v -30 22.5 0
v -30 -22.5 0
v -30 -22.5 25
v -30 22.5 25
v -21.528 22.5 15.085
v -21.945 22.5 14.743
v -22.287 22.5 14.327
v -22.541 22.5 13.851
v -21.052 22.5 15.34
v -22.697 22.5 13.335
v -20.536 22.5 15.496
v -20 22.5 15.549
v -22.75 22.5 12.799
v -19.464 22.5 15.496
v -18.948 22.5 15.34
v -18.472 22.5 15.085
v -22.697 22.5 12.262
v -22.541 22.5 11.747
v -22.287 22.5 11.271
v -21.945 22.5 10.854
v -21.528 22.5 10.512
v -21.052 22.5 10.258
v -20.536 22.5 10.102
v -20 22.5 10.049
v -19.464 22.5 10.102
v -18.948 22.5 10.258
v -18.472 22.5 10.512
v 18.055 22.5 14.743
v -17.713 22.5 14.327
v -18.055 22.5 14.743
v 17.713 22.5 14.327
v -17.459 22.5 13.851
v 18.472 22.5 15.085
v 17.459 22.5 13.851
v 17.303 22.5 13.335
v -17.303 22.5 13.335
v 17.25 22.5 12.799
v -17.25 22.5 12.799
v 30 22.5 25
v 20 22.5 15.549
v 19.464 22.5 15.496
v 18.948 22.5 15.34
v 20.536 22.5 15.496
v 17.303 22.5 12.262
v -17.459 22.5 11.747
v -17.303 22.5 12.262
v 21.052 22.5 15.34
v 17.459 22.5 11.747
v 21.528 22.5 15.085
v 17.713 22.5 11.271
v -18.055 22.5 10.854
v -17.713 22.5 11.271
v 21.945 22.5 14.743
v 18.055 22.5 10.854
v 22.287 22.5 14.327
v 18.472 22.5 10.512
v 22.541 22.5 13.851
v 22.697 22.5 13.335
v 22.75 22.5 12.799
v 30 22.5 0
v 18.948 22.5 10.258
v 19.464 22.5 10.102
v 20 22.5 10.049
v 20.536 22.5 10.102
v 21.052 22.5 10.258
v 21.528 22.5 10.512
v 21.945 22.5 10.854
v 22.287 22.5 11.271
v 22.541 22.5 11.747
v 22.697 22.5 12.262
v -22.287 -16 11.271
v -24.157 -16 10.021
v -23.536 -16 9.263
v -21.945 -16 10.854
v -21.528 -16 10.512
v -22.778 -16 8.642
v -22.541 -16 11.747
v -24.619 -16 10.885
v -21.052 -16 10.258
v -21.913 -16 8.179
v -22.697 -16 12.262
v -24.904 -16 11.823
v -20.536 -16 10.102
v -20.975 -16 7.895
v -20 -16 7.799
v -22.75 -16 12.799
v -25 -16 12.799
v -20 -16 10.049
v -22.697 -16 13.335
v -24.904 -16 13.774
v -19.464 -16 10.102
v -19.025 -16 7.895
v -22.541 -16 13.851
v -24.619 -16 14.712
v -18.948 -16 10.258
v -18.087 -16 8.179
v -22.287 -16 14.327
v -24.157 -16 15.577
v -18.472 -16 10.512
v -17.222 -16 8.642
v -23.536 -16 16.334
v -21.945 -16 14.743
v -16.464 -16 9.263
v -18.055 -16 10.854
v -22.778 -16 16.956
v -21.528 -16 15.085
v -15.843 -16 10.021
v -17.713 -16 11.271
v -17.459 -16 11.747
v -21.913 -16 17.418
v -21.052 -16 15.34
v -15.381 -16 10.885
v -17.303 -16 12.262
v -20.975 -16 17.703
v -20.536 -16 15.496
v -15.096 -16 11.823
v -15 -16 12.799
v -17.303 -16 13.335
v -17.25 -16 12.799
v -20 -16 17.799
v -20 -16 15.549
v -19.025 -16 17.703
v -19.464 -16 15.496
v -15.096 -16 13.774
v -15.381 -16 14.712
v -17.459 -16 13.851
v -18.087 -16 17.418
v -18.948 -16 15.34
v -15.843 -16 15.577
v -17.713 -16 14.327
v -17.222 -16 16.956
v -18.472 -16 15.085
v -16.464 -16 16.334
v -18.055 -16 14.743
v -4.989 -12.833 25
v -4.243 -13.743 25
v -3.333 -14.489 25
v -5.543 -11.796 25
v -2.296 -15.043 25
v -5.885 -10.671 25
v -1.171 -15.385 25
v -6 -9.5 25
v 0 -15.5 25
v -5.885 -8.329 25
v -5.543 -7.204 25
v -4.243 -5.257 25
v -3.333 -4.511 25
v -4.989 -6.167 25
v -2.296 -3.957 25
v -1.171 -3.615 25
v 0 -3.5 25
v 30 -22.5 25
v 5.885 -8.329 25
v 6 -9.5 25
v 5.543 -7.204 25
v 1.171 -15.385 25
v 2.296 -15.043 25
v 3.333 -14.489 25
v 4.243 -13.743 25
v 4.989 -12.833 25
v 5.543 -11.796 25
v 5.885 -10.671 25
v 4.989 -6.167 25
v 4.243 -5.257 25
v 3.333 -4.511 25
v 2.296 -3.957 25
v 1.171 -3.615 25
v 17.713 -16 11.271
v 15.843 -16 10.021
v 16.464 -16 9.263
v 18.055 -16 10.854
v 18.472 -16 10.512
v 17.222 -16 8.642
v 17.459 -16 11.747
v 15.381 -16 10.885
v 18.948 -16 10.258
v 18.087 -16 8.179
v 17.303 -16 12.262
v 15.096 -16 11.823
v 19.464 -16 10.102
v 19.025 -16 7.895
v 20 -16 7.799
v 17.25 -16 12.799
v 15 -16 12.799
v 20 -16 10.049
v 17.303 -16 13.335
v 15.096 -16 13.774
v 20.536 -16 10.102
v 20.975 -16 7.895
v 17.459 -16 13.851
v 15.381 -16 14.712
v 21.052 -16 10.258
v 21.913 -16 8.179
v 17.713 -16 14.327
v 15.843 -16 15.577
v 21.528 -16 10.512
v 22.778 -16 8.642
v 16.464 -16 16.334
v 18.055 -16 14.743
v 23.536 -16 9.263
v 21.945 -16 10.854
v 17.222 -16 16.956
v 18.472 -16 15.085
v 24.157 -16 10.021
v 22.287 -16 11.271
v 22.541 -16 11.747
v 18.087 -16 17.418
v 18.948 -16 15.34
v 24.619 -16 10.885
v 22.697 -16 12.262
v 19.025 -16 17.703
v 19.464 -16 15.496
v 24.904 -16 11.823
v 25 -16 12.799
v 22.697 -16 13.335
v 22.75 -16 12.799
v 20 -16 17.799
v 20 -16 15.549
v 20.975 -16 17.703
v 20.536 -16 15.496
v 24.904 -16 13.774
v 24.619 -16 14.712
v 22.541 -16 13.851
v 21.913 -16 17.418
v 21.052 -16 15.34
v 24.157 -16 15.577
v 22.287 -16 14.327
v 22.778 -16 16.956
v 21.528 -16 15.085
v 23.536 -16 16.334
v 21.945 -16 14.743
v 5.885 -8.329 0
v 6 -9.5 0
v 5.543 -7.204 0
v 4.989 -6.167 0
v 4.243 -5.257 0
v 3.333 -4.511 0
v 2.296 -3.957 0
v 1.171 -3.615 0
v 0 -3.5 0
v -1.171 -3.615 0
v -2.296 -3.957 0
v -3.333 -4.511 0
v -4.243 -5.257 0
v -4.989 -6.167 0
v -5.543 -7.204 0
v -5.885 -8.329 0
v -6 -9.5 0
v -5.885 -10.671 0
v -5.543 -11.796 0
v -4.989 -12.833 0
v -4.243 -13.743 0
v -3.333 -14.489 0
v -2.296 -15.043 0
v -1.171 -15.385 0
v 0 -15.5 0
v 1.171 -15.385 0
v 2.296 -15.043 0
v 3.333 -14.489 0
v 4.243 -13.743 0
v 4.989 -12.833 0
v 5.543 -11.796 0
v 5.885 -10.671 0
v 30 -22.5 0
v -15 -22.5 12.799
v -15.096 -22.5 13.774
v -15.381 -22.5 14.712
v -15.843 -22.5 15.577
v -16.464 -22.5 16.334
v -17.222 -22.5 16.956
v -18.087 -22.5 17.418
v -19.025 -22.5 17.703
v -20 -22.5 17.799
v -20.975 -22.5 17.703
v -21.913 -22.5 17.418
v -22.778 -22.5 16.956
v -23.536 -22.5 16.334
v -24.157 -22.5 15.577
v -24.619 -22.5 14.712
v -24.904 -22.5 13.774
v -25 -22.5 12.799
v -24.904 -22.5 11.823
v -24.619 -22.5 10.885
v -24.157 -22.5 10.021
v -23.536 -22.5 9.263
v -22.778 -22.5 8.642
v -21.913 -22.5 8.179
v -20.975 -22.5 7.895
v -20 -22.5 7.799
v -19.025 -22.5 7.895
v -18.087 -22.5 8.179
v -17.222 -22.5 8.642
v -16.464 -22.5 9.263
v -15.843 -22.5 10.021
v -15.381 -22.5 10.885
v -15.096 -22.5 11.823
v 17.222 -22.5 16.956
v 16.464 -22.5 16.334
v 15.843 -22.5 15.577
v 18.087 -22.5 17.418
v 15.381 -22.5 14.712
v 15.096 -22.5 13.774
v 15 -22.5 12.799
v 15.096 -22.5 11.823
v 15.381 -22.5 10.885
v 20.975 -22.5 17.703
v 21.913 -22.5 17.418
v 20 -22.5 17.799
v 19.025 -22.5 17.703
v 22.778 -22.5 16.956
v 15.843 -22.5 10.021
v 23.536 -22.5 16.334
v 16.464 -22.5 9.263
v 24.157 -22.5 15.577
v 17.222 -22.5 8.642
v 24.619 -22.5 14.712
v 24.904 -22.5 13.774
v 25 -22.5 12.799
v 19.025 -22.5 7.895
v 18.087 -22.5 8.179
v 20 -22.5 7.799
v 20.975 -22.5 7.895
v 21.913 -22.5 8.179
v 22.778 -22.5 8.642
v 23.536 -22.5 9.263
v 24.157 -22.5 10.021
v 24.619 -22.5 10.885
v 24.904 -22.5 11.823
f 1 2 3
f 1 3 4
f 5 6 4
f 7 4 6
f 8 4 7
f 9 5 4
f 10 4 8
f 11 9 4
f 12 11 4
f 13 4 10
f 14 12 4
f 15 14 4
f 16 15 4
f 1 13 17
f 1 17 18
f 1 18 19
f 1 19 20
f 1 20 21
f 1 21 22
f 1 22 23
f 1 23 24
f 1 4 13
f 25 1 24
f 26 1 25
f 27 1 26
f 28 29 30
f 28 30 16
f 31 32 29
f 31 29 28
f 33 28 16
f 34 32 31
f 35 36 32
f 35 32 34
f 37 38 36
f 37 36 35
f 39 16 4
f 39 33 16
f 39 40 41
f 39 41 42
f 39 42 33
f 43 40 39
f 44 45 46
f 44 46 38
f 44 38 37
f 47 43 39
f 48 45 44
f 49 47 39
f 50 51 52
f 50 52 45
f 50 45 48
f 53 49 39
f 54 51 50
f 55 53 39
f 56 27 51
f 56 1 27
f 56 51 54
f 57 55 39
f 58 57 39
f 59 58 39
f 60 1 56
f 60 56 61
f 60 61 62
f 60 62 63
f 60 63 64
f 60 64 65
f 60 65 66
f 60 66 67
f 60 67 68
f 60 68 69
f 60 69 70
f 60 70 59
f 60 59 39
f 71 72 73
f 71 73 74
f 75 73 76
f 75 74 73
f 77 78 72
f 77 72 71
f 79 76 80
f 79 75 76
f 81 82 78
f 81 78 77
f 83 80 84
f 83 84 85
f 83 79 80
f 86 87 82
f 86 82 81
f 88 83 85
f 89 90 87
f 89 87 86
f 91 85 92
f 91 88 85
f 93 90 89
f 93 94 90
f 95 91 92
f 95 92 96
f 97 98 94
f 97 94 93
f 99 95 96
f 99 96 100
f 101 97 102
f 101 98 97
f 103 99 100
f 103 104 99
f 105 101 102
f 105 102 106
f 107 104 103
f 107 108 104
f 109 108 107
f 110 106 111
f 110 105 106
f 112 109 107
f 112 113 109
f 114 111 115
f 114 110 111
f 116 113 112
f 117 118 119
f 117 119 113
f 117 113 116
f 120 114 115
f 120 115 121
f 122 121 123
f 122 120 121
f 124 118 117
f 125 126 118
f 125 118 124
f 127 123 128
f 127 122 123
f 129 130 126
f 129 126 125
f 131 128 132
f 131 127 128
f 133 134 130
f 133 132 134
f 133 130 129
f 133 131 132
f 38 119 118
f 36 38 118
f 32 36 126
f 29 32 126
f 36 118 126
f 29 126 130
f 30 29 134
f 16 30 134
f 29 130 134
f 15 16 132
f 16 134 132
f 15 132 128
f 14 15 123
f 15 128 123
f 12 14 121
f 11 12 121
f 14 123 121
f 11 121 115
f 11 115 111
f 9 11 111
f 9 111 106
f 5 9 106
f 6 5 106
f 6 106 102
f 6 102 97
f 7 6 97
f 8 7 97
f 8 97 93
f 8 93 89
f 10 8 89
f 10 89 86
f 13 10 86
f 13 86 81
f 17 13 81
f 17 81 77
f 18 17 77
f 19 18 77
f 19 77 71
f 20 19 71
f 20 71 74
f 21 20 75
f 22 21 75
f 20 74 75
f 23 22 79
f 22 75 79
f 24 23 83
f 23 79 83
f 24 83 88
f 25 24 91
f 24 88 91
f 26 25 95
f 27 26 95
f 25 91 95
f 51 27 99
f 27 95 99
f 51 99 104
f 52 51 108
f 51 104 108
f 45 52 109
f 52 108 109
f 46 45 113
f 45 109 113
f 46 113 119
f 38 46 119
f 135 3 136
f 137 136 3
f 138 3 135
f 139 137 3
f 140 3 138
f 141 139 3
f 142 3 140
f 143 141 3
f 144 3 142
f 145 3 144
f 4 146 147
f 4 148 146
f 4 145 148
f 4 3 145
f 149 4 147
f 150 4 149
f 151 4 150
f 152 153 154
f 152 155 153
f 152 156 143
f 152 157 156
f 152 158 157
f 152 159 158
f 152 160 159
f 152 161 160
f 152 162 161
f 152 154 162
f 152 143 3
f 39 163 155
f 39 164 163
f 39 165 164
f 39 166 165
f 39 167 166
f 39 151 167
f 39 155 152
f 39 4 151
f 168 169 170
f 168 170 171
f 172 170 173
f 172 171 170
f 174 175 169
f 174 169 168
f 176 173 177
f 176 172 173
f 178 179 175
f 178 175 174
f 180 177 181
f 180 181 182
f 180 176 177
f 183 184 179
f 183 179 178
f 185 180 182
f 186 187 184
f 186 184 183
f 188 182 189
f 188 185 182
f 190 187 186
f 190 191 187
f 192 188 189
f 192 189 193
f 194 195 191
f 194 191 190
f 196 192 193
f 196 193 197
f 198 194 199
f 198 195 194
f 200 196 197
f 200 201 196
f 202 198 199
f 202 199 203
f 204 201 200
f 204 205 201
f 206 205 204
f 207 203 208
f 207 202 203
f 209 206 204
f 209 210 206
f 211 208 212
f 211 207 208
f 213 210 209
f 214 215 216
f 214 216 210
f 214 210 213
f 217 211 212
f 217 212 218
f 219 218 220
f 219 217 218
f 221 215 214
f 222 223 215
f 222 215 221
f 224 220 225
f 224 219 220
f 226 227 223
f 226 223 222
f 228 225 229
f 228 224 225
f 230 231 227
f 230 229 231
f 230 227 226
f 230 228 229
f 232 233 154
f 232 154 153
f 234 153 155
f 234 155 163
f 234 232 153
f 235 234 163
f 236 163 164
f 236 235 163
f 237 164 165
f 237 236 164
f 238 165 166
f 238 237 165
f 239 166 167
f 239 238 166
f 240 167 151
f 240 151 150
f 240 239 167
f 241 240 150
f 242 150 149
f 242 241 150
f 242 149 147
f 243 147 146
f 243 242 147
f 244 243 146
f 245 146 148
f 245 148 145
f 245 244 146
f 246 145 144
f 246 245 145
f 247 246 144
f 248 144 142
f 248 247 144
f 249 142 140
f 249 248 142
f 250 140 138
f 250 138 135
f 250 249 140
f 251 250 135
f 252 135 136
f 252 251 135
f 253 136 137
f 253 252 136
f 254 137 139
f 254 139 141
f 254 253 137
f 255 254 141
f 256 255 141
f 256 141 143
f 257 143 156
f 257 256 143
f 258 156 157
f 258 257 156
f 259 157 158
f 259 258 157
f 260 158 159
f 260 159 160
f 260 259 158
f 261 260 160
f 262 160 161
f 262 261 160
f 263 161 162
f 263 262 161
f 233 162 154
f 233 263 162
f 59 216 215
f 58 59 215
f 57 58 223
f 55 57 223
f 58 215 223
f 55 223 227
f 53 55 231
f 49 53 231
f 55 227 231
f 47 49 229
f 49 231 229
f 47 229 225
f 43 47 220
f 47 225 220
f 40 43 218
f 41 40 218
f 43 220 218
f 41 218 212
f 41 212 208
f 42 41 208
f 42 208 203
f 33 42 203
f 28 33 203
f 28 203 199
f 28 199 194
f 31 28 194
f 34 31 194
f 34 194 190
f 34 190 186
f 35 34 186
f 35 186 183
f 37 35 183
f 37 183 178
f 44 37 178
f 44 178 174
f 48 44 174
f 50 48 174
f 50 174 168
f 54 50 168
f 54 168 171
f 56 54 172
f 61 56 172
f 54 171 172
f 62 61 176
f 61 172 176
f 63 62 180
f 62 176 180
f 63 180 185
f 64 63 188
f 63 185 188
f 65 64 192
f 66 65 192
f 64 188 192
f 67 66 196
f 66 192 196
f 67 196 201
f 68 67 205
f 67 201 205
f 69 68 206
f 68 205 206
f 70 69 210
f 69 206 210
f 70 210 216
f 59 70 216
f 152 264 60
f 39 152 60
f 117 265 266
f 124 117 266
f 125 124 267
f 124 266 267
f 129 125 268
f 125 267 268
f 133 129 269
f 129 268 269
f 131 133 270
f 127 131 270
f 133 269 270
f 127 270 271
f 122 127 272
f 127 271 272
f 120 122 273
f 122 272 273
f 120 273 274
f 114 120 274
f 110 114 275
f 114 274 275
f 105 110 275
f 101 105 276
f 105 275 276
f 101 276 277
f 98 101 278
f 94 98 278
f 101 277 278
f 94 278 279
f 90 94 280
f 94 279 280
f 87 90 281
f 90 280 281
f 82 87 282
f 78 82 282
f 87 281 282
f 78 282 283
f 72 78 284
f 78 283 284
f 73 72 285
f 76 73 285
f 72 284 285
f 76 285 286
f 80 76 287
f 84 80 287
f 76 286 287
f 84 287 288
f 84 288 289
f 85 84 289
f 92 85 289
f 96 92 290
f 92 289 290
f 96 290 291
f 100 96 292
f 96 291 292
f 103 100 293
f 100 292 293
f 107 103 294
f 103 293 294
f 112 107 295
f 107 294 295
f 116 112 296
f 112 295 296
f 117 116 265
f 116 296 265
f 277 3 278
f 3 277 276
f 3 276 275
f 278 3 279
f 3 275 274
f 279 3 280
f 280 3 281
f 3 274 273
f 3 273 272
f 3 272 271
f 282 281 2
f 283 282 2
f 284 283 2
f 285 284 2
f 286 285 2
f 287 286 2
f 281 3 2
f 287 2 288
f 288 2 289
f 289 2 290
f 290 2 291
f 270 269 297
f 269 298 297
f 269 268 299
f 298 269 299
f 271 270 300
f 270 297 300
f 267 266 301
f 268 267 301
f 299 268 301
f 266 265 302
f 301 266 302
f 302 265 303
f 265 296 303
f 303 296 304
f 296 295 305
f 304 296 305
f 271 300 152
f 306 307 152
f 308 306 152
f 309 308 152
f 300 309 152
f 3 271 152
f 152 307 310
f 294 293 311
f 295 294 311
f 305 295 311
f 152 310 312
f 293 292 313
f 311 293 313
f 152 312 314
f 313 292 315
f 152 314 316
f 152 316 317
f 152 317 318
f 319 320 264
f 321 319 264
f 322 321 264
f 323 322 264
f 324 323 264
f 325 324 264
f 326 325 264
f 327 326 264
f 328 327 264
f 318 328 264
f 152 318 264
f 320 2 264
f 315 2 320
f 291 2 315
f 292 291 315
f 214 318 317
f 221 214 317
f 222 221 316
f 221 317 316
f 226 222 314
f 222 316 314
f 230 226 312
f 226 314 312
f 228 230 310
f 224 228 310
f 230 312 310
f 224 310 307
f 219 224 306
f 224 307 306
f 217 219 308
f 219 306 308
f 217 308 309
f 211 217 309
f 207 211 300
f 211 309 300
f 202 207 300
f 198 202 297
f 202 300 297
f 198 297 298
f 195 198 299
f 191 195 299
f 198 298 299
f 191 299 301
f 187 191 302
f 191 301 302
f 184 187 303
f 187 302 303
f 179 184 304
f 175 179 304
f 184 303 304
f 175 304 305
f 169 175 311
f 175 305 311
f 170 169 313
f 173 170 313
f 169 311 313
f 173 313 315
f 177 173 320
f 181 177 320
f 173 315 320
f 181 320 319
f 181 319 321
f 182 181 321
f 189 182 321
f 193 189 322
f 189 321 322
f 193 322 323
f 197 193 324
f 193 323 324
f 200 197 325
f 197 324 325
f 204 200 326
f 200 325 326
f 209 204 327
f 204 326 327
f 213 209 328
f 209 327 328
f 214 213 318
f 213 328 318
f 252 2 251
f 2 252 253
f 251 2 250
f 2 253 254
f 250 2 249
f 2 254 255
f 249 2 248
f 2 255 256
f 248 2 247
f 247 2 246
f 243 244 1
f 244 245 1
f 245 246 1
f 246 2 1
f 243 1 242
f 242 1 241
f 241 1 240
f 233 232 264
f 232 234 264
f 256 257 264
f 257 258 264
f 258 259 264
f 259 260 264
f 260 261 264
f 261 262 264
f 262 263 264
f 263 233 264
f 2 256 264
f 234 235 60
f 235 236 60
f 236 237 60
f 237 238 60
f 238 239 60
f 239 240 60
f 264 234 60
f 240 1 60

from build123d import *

# Parameters (mm, degrees)
F0_W     = 60
F0_H     = 45
F0_R     = 6
F1_DEPTH = 25
F2_R     = 2.75
F3_DEPTH = 45
F2_R_2   = 5
F4_DEPTH = 6.5


with BuildPart() as f1:
    # F0 (on Top) → F1 (new body)
    with BuildSketch(Plane.XY):
        Rectangle(F0_W, F0_H)
        with Locations((0, -9.5)):
            Circle(F0_R, mode=Mode.SUBTRACT)
    extrude(amount=F1_DEPTH)

    # F2 (on face) → F3 (cut)
    with BuildSketch(Plane.XZ.offset(22.5)):
        with Locations((-20, 12.798888)):
            Circle(F2_R)
        with Locations((20, 12.798888)):
            Circle(F2_R)
    extrude(amount=-F3_DEPTH, mode=Mode.SUBTRACT)

    # F2 (on face) → F4 (cut)
    with BuildSketch(Plane.XZ.offset(22.5)):
        with Locations((-20, 12.798888)):
            Circle(F2_R_2)
        with Locations((-20, 12.798888)):
            Circle(F2_R, mode=Mode.SUBTRACT)
        with Locations((20, 12.798888)):
            Circle(F2_R_2)
        with Locations((20, 12.798888)):
            Circle(F2_R, mode=Mode.SUBTRACT)
    extrude(amount=-F4_DEPTH, mode=Mode.SUBTRACT)


solid = f1.part
